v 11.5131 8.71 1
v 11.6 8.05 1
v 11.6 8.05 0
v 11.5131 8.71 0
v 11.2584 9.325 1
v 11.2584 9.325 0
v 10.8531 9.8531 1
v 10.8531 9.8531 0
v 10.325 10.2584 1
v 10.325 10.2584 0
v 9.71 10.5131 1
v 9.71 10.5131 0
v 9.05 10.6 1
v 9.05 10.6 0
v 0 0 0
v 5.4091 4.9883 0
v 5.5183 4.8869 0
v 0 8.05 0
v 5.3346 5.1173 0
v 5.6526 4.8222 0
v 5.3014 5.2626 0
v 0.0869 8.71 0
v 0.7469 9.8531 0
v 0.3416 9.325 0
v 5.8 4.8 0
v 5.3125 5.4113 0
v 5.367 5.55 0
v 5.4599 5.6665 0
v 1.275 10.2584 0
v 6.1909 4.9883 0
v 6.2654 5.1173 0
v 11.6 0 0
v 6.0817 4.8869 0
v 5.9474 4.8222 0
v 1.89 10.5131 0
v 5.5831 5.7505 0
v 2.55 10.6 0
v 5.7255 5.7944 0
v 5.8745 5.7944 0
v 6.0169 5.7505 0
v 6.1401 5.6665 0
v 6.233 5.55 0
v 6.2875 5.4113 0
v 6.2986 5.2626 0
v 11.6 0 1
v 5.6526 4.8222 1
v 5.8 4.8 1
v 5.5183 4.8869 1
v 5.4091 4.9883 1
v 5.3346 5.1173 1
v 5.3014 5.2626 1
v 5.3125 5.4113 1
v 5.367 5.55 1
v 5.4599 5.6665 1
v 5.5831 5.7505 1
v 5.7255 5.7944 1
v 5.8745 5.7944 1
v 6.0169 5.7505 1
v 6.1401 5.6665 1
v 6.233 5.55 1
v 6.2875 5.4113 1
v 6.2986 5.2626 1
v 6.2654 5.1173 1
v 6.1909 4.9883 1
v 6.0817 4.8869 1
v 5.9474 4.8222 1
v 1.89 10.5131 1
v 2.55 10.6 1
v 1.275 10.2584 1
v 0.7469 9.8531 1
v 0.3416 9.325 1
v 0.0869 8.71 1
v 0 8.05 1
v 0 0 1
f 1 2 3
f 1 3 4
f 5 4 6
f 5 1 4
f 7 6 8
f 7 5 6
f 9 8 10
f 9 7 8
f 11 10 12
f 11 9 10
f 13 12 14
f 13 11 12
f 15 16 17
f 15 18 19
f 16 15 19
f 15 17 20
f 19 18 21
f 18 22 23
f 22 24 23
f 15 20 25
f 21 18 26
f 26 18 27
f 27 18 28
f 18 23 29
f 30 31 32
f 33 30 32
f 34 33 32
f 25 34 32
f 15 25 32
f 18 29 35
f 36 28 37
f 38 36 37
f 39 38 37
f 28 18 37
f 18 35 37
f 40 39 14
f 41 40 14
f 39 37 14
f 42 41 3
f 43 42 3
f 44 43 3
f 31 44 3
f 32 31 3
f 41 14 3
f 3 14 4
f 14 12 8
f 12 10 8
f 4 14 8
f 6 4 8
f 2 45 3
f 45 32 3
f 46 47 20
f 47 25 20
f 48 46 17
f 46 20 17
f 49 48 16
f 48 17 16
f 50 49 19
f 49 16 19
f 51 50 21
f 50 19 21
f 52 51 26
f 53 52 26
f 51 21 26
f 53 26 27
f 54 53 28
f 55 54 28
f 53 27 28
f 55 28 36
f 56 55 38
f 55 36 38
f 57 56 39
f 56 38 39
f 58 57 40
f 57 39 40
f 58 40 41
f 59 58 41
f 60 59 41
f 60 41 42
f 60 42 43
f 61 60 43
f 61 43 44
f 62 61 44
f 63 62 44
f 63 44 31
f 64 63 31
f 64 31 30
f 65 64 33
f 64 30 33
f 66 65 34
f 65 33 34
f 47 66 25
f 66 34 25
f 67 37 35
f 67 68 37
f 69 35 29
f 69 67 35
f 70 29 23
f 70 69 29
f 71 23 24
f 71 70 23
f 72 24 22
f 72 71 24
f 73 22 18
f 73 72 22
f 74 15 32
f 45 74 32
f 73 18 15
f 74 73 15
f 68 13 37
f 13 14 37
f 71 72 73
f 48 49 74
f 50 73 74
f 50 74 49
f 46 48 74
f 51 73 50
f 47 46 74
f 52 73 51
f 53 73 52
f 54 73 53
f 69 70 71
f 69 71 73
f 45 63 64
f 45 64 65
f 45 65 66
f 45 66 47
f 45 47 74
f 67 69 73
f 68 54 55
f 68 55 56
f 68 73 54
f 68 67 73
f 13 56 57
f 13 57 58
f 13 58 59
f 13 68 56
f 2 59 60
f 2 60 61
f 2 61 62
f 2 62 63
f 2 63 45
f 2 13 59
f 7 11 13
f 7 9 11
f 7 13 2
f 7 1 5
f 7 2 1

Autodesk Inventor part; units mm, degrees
ref_plane "YZ Plane" through (0, 0, 0) normal (1, 0, 0) x (0, 1, 0)
ref_plane "XZ Plane" through (0, 0, 0) normal (0, 1, 0) x (-1, 0, 0)
ref_plane "XY Plane" through (0, 0, 0) normal (0, 0, 1) x (1, 0, 0)
sketch "Эскиз1" plane through (0, 0, 0) normal (0, 0, 1) x (1, 0, 0)
  line L0 (0, 0) -> (11.6, 0)
  line L1 (11.6, 0) -> (11.6, 10.6)
  line L2 (11.6, 10.6) -> (0, 10.6)
  line L3 (0, 10.6) -> (0, 0)
  dimension "d0" = 11.6
  dimension "d1" = 10.6
extrude "Выдавливание1" add sketch "Эскиз1" along normal blind 1
fillet "Сопряжение1" radius 2.55 2 edges at (11.6, 10.6, 0.5) (0, 10.6, 0.5)
sketch "Эскиз2" plane through (0, 0, 1) normal (0, 0, 1) x (1, 0, 0)
  line L0 (0, 0) -> (11.6, 0) projected
  line L1 (5.8, 0) -> (5.8, 10.6)
  line L2 (9.05, 10.6) -> (2.55, 10.6) projected
  point P0 (5.8, 5.3)
hole "Отверстие1" at (5.8, 5.3, 1) direction (0, 0, -1) diameter 1 end through all
properties part number "Encoder"
